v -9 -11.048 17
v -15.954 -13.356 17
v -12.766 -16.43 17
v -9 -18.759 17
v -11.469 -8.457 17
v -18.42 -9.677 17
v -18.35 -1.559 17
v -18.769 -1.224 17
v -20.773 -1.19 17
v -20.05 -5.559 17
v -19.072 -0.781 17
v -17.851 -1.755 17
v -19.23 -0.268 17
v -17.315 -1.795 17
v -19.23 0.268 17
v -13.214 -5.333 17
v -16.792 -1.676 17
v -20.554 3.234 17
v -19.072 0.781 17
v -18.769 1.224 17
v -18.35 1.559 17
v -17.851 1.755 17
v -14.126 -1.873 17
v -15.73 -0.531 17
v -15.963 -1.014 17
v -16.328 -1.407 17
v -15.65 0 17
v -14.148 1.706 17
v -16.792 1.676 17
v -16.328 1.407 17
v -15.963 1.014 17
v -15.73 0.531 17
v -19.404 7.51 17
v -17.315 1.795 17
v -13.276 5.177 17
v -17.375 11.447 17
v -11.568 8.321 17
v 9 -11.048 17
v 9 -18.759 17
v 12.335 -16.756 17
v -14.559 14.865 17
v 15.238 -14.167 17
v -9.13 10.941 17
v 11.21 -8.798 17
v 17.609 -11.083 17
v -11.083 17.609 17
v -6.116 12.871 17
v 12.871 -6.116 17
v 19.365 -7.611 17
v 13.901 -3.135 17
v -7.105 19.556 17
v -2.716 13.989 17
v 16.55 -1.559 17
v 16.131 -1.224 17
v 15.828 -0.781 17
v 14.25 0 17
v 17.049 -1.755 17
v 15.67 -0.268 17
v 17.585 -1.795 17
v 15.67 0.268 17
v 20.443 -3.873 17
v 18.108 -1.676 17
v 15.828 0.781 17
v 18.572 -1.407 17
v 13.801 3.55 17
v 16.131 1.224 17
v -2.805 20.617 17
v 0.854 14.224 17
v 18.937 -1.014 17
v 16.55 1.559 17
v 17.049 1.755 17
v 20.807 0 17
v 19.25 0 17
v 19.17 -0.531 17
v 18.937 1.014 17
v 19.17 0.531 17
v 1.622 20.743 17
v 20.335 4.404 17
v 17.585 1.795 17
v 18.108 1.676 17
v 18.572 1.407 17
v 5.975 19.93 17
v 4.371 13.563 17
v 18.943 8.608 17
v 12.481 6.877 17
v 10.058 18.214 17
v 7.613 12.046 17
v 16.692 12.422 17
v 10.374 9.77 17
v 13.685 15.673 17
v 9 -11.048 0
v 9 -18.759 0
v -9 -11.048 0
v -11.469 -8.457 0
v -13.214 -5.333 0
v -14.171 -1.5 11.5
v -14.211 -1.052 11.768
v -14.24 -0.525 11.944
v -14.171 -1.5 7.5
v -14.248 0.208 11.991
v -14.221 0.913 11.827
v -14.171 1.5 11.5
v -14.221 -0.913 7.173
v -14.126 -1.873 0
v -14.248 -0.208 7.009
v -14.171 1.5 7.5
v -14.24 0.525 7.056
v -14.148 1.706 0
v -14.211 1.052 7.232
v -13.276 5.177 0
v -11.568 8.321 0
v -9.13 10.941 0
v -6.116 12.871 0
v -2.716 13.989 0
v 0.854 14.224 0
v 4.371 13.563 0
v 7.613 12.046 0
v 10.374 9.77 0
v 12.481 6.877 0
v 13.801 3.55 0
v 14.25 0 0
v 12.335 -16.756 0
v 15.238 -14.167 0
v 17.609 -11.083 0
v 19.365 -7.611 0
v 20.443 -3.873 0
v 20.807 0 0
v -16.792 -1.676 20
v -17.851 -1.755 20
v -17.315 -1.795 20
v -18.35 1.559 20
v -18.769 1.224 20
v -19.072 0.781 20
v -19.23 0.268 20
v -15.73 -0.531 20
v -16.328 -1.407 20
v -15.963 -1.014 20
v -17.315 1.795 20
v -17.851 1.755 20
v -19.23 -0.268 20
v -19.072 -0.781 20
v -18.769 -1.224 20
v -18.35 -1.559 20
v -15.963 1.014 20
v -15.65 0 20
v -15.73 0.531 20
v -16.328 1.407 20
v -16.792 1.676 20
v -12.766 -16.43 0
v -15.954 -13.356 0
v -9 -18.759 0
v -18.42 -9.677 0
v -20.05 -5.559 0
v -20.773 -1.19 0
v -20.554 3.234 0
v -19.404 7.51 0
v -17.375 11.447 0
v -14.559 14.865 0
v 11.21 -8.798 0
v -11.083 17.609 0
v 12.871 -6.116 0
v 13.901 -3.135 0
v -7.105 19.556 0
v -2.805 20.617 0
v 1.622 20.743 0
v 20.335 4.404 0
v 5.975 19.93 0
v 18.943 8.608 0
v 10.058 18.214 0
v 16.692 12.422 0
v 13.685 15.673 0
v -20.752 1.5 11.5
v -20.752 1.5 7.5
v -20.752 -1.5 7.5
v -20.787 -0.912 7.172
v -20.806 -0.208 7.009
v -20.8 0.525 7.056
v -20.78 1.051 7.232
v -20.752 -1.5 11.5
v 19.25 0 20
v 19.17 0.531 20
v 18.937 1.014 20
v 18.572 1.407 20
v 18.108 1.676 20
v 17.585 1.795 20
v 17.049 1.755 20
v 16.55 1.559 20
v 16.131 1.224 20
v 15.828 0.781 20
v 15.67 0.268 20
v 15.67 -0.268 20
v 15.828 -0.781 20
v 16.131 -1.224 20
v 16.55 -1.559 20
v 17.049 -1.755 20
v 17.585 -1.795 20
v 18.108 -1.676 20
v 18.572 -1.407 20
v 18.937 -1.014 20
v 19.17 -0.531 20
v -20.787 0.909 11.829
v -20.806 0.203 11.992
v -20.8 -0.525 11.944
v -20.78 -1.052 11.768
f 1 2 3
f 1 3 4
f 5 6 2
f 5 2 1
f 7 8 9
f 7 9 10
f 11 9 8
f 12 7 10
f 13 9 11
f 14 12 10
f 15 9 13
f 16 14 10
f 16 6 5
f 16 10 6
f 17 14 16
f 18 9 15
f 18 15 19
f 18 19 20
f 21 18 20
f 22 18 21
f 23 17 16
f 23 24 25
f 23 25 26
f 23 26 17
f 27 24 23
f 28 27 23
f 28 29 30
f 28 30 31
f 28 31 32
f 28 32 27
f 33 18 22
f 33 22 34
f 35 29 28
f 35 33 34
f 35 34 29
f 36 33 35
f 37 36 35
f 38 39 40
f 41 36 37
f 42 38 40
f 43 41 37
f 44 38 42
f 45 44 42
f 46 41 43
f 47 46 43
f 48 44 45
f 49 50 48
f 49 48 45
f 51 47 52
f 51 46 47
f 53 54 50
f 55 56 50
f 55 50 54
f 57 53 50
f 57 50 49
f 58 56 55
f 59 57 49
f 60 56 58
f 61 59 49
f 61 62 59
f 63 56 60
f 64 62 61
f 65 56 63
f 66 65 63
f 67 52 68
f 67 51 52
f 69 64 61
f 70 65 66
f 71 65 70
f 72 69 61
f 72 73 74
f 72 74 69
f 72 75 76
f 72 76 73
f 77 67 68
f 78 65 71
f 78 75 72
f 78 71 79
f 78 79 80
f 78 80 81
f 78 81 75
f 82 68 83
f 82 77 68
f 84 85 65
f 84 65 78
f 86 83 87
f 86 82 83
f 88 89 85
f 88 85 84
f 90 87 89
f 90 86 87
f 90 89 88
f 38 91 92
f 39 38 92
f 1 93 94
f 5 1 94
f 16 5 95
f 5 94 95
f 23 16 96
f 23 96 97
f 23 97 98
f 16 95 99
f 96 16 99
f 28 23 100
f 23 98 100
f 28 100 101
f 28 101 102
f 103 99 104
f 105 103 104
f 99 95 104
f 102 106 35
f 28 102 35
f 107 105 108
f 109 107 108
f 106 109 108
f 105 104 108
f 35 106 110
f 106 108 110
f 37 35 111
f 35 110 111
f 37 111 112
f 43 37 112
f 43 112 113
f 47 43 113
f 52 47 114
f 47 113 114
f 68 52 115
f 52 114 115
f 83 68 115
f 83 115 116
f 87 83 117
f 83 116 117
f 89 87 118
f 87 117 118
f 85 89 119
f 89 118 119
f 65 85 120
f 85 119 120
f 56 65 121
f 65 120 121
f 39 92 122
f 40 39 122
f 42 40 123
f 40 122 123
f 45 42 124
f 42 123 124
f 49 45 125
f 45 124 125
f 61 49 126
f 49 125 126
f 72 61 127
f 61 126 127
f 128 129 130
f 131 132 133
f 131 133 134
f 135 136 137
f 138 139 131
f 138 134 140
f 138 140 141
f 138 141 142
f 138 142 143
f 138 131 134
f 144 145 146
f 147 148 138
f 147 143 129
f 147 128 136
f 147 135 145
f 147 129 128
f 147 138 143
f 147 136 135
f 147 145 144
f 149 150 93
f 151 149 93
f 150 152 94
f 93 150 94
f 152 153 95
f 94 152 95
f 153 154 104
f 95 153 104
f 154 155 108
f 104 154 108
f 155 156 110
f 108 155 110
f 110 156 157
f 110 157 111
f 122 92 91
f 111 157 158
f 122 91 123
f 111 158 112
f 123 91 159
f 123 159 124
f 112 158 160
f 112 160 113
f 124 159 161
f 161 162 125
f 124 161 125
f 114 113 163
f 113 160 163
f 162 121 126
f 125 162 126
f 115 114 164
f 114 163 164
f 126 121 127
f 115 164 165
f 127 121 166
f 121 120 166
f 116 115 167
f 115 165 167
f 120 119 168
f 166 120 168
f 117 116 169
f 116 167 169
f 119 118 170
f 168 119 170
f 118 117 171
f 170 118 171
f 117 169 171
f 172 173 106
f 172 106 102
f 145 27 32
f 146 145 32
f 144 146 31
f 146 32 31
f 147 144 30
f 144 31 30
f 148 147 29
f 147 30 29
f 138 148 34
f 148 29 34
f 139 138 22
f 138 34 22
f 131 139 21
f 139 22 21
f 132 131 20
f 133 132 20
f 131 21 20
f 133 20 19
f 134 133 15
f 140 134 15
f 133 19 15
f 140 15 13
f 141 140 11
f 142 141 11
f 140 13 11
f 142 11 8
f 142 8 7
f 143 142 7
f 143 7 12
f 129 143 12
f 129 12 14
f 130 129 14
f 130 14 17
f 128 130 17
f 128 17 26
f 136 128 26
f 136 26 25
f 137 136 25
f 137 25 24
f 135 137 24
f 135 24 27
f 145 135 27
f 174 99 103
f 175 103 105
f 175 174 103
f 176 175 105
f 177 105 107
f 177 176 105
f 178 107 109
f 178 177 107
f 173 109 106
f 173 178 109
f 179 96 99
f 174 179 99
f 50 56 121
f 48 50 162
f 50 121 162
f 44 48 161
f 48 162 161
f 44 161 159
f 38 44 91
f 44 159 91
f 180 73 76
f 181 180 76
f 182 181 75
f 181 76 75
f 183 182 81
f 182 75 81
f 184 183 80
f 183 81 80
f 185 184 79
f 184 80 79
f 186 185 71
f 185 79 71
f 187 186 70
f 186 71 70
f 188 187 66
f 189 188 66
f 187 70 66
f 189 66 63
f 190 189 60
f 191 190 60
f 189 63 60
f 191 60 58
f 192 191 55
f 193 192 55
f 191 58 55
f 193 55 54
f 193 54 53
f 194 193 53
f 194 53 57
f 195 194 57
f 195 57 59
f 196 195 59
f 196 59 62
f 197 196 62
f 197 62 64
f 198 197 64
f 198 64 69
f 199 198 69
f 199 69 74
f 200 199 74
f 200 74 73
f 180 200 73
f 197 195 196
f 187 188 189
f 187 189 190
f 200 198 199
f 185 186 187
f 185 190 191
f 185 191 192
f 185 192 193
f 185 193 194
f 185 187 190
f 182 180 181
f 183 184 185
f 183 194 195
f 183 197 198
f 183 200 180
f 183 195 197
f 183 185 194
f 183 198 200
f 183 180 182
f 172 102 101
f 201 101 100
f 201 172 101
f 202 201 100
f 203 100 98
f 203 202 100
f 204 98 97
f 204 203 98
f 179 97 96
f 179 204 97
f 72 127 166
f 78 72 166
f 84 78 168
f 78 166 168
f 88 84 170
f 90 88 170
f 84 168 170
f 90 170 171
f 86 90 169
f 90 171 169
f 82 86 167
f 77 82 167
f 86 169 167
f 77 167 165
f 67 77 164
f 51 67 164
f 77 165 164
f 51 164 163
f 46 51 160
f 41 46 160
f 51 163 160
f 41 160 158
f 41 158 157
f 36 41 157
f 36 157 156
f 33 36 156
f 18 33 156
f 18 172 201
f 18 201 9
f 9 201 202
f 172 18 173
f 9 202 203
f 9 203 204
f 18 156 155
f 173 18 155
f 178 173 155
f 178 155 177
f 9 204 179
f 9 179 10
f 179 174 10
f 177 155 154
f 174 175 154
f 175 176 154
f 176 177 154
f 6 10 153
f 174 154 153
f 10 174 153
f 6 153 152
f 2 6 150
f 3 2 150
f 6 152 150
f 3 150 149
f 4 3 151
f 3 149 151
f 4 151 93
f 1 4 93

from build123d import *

# Parameters (mm, degrees)
F0_R     = 1.8
F1_DEPTH = 17
F2_DEPTH = 20
F5_DEPTH = 6.6367971034


with BuildPart() as f1:
    # F0 (on Top) → F1 (new body)
    with BuildSketch(Plane.XY):
        with BuildLine():
            ThreePointArc((-9, -11.048189897), (-6.1160649114, 12.8707517263), (14.25, 0))
            ThreePointArc((14.25, 0), (12.8707517263, -6.1160649114), (9, -11.048189897))
            Line((9, -11.048189897), (9, -18.7594200464))
            ThreePointArc((9, -18.7594200464), (17.6093087314, -11.0827833364), (20.8066297242, 0))
            ThreePointArc((20.8066297242, 0), (-11.0827833364, 17.6093087314), (-9, -18.7594200464))
            Line((-9, -18.7594200464), (-9, -11.048189897))
        make_face()
        with Locations((-17.45, 0)):
            Circle(F0_R, mode=Mode.SUBTRACT)
        with Locations((17.45, 0)):
            Circle(F0_R, mode=Mode.SUBTRACT)
        with Locations((17.45, 0)):
            Circle(F0_R)
        with Locations((-17.45, 0)):
            Circle(F0_R)
    extrude(amount=F1_DEPTH)

    # F0 (on Top) → F2 (join)
    with BuildSketch(Plane.XY):
        with Locations((17.45, 0)):
            Circle(F0_R)
        with Locations((-17.45, 0)):
            Circle(F0_R)
    extrude(amount=F2_DEPTH)

    # F4 (on plane+point) → F5 (cut, through all)
    with BuildSketch(Plane.YZ.offset(-20.8066297242)):
        with BuildLine():
            Line((1.5, 7.5), (1.5, 11.5))
            ThreePointArc((1.5, 11.5), (0, 12), (-1.5, 11.5))
            Line((-1.5, 11.5), (-1.5, 7.5))
            ThreePointArc((-1.5, 7.5), (0, 7), (1.5, 7.5))
        make_face()
    extrude(amount=F5_DEPTH, mode=Mode.SUBTRACT)


solid = f1.part
